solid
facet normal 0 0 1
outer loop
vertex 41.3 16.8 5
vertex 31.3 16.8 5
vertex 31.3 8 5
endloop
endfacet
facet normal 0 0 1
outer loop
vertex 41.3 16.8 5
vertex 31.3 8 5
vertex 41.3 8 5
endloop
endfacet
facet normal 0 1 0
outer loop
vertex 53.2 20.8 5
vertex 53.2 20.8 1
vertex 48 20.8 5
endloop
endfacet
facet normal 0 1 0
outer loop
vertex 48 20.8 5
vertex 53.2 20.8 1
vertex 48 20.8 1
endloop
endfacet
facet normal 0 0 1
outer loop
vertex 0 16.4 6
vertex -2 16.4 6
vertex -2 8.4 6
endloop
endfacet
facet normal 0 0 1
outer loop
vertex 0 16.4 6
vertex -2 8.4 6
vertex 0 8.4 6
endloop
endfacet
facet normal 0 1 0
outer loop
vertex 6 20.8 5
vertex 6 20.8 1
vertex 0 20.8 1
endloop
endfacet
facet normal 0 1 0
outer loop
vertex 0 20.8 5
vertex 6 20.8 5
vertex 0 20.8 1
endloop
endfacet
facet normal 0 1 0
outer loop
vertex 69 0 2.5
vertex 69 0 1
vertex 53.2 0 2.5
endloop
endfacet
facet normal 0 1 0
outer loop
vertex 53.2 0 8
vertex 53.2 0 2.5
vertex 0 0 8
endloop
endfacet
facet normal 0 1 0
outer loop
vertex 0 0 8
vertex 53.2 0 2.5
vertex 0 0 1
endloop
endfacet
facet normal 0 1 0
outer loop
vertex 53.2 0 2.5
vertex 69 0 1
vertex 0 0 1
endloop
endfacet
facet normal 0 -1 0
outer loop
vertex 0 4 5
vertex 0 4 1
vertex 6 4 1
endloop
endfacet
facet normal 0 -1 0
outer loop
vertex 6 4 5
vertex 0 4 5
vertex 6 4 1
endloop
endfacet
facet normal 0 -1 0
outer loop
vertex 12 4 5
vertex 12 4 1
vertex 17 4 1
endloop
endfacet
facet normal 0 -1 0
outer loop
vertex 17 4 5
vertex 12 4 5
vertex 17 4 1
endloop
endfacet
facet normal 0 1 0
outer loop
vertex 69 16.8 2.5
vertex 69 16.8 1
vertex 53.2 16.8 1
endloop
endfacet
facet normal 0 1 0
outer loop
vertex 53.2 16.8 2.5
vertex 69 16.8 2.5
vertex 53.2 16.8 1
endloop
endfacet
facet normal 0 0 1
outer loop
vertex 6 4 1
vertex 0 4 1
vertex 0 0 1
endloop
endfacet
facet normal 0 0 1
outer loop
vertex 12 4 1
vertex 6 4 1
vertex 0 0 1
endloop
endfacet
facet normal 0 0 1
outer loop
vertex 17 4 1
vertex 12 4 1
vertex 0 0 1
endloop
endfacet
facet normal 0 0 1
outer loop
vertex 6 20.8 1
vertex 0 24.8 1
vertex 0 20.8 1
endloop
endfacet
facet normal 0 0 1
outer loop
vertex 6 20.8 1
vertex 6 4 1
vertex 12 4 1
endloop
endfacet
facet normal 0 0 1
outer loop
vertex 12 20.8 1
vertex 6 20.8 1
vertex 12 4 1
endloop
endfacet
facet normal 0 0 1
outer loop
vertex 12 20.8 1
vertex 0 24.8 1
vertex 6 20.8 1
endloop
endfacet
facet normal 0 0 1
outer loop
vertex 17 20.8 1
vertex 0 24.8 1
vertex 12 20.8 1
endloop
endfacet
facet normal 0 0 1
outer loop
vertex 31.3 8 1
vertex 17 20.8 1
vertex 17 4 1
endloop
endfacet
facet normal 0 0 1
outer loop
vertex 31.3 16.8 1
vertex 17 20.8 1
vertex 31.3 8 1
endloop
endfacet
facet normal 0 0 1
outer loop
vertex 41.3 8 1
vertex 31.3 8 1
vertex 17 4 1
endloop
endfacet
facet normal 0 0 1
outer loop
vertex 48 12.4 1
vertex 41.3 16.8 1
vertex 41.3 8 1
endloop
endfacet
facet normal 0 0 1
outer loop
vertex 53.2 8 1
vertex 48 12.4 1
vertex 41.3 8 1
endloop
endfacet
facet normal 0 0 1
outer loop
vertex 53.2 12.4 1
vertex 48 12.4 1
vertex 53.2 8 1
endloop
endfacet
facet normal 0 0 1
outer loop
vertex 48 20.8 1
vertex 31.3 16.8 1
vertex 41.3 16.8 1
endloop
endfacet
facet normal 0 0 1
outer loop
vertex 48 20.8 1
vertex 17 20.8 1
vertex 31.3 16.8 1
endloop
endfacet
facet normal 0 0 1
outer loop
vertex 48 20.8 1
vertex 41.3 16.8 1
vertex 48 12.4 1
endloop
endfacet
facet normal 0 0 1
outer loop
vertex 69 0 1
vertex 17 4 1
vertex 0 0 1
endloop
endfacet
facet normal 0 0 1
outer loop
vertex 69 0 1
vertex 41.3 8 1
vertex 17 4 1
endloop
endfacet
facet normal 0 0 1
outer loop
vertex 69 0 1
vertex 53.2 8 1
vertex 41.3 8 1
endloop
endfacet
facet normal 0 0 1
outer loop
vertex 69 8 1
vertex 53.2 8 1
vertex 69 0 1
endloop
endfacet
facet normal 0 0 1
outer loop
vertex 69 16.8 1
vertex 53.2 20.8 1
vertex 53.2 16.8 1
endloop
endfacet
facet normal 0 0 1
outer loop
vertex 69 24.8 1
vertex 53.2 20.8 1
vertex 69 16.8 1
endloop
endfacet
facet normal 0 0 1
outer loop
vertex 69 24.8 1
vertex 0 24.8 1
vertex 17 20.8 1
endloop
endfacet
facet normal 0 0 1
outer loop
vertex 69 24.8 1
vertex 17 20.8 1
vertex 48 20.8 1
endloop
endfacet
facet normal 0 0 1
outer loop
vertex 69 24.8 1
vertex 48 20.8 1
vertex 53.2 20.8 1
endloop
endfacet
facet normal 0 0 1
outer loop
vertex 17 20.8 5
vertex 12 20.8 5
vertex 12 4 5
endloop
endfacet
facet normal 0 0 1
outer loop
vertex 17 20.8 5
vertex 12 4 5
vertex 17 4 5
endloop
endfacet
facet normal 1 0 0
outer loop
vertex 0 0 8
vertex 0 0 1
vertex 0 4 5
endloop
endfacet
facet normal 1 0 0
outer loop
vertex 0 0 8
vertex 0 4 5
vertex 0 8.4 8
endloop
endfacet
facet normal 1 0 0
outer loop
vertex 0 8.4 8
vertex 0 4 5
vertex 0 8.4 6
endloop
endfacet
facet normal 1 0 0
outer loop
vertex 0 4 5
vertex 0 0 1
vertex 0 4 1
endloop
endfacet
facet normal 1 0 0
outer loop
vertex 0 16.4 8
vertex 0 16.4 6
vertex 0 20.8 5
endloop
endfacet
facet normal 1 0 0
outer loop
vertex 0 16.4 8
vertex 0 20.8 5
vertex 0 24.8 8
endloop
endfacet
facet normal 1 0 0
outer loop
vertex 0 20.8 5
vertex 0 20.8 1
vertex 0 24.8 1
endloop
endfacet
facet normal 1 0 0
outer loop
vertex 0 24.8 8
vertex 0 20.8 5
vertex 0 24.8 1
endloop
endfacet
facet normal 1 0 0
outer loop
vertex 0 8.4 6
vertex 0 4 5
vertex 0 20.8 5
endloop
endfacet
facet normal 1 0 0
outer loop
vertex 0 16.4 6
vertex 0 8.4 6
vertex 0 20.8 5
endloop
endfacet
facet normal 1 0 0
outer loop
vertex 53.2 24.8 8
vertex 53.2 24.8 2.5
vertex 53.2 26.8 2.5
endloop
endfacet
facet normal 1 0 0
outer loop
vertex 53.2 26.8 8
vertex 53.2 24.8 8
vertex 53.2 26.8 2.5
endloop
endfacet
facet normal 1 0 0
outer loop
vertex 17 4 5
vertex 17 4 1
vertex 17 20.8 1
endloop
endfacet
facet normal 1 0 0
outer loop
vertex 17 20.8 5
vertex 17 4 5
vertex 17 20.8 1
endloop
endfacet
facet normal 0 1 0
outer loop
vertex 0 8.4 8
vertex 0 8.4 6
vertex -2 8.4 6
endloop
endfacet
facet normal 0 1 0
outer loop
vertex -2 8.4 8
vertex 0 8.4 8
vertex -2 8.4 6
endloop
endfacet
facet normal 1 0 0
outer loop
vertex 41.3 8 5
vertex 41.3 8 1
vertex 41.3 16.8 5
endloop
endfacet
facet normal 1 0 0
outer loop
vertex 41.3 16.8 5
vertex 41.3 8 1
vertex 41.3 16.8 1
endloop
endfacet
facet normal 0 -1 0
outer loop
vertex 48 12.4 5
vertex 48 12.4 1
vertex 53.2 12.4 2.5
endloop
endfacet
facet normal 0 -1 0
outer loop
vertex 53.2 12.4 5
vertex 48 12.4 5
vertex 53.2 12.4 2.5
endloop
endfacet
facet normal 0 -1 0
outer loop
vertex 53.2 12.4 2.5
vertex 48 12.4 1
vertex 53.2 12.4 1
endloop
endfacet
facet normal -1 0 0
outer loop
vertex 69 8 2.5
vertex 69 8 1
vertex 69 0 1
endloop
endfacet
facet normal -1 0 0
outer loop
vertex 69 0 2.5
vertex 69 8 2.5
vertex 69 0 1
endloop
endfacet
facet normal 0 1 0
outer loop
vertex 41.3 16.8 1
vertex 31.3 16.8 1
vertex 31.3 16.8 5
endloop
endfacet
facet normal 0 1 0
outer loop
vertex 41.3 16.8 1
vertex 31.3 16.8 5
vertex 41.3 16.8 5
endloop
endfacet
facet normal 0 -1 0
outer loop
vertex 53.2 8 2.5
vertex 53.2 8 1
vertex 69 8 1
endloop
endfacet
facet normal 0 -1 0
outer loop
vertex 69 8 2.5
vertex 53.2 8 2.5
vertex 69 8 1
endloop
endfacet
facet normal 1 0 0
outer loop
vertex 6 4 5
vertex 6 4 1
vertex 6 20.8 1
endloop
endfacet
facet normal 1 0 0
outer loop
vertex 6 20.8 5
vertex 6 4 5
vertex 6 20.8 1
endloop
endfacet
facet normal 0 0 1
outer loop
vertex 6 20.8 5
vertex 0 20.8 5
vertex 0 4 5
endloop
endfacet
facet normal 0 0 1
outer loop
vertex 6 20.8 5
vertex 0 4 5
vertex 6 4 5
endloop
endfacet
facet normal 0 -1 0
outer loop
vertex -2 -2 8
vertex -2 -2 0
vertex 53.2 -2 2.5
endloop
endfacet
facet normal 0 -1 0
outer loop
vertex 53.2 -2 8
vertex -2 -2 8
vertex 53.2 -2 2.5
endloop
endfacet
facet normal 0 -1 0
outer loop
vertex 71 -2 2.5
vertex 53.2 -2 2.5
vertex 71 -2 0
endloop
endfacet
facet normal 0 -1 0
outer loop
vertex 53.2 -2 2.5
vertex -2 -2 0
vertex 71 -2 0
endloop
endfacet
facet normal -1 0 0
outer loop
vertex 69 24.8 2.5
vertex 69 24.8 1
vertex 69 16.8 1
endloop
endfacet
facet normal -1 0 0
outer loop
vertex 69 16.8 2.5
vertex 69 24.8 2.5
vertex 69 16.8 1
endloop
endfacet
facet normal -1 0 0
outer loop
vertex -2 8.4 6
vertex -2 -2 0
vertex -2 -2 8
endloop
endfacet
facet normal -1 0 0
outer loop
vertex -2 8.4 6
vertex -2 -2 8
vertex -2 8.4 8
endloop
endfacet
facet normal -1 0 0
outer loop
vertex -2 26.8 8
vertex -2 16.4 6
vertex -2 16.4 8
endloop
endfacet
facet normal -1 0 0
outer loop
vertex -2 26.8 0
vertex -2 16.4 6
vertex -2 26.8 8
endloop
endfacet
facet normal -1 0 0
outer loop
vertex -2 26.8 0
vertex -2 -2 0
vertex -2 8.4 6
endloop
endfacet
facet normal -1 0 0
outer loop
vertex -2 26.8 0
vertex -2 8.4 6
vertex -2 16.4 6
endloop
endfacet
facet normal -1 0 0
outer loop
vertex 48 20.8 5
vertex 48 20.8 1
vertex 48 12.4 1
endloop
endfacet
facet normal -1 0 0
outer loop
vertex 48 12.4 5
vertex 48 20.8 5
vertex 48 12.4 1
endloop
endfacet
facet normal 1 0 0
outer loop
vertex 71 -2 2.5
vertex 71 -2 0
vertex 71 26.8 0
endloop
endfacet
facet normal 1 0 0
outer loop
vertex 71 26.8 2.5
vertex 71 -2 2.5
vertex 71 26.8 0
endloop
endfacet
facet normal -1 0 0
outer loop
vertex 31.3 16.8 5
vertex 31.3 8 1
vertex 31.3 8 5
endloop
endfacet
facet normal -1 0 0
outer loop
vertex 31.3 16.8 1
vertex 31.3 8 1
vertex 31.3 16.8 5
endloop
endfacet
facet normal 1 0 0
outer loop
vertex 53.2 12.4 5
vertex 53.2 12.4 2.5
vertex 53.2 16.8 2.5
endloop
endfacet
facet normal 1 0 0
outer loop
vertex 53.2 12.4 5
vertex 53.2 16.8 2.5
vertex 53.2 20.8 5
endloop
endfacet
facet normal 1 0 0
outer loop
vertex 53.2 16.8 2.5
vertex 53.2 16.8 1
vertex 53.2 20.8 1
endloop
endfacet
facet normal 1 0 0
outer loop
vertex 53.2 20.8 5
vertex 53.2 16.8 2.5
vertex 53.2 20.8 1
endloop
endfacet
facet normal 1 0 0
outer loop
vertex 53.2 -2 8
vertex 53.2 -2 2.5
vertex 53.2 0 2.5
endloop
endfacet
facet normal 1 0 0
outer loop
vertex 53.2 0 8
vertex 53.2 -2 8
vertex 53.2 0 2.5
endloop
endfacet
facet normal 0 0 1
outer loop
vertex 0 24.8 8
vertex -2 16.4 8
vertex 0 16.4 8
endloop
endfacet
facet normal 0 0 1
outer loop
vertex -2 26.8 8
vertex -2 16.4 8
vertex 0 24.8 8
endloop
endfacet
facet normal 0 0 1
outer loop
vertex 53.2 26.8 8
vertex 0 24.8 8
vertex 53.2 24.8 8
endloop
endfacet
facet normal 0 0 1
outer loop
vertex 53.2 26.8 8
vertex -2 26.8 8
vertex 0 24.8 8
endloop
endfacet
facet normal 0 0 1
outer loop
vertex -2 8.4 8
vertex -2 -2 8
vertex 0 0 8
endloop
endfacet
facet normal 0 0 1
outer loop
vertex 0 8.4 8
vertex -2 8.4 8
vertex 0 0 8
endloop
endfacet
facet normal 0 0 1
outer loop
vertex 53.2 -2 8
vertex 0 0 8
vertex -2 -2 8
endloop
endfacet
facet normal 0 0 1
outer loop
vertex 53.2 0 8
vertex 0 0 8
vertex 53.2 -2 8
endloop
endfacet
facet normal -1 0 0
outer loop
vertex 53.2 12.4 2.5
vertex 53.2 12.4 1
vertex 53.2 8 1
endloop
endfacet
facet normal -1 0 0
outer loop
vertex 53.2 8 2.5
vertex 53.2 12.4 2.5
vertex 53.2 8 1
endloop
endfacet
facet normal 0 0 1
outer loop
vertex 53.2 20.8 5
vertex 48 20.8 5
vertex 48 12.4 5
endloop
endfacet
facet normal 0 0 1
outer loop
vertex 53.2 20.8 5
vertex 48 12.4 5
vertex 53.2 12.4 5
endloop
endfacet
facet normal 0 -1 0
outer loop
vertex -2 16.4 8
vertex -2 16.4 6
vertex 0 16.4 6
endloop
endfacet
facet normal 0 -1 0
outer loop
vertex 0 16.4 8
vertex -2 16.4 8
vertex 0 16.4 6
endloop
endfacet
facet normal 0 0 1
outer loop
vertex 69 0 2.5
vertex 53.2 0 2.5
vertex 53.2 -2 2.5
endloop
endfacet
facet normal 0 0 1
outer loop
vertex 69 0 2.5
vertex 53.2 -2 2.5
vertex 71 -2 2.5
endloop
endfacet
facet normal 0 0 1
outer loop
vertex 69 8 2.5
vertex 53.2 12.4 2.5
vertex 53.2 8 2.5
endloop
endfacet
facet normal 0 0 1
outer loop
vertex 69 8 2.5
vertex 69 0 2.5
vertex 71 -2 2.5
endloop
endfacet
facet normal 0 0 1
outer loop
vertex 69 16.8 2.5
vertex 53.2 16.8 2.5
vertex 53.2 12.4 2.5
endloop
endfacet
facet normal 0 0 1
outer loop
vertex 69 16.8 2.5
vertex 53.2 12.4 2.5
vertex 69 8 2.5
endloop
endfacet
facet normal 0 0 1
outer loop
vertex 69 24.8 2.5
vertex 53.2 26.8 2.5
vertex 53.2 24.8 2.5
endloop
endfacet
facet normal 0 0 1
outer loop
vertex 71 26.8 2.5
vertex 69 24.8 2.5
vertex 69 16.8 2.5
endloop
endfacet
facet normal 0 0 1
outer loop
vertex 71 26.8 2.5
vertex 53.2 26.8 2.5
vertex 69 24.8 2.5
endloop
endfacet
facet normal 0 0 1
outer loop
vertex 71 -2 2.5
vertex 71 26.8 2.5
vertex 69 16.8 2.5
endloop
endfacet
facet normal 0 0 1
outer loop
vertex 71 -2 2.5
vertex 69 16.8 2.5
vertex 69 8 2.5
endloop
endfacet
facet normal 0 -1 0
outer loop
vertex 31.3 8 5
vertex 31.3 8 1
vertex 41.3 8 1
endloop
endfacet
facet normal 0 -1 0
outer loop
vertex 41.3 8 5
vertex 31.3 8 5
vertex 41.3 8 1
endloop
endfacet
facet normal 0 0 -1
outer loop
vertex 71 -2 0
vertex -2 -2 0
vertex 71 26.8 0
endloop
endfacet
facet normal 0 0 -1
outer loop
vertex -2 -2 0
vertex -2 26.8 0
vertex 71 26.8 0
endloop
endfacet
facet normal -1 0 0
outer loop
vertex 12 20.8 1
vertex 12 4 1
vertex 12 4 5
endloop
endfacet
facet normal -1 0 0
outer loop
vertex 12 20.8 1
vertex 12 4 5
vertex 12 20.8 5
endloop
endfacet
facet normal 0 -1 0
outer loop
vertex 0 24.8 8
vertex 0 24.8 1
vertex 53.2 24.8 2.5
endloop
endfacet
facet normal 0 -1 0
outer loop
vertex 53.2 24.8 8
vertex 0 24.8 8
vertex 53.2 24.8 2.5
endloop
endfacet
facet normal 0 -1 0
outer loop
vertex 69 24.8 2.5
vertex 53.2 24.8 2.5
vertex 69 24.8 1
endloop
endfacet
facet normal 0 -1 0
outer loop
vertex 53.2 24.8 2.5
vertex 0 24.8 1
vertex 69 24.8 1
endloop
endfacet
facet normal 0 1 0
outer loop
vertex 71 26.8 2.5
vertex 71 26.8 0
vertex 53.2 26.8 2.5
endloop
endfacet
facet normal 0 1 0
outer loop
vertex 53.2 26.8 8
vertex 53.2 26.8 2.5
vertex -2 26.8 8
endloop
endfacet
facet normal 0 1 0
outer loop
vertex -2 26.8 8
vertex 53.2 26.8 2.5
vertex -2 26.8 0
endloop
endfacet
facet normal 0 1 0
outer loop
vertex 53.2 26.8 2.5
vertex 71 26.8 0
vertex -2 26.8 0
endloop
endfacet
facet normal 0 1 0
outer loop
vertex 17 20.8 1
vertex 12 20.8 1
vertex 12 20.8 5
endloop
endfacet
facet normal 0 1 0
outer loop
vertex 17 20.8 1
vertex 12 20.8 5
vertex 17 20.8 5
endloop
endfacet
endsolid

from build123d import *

# Parameters (mm, degrees)
F0_W     = 5
F0_H     = 16.8
F0_W_2   = 10
F0_H_2   = 8.8
F0_W_3   = 15.8
F0_H_3   = 8
F1_DEPTH = 1
F0_H_4   = 2
F2_DEPTH = 2.5
F3_DEPTH = 5
F4_DEPTH = 8
F0_W_4   = 2
F5_DEPTH = 6


with BuildPart() as f1:
    # F0 (on Top) → F1 (new body)
    with BuildSketch(Plane.XY):
        Polygon((69, 24.8), (53.2, 24.8), (53.2, 20.8), (53.2, 16.8), (69, 16.8), align=None)
        Polygon((0, 24.8), (0, 20.8), (6, 20.8), (6, 4), (0, 4), (0, 0), (53.2, 0), (53.2, 8), (53.2, 12.4), (48, 12.4), (48, 20.8), (53.2, 20.8), (53.2, 24.8), align=None)
        with Locations((14.5, 12.4)):
            Rectangle(F0_W, F0_H, mode=Mode.SUBTRACT)
        with Locations((36.3, 12.4)):
            Rectangle(F0_W_2, F0_H_2, mode=Mode.SUBTRACT)
        with Locations((61.1, 4)):
            Rectangle(F0_W_3, F0_H_3)
    extrude(amount=F1_DEPTH)

    # F0 (on Top) → F2 (join)
    with BuildSketch(Plane.XY):
        with Locations((61.1, 25.8)):
            Rectangle(F0_W_3, F0_H_4)
        Polygon((69, 8), (69, 16.8), (53.2, 16.8), (53.2, 12.4), (53.2, 8), align=None)
        with Locations((61.1, -1)):
            Rectangle(F0_W_3, F0_H_4)
        Polygon((69, 26.8), (69, 24.8), (69, 16.8), (69, 8), (69, 0), (69, -2), (71, -2), (71, 26.8), align=None)
    extrude(amount=F2_DEPTH)

    # F0 (on Top) → F3 (join)
    with BuildSketch(Plane.XY):
        Polygon((6, 20.8), (0, 20.8), (0, 16.4), (0, 8.4), (0, 4), (6, 4), align=None)
        with Locations((14.5, 12.4)):
            Rectangle(F0_W, F0_H)
        with Locations((36.3, 12.4)):
            Rectangle(F0_W_2, F0_H_2)
        Polygon((53.2, 16.8), (53.2, 20.8), (48, 20.8), (48, 12.4), (53.2, 12.4), align=None)
    extrude(amount=F3_DEPTH)

    # F0 (on Top) → F4 (join)
    with BuildSketch(Plane.XY):
        Polygon((0, 16.4), (0, 20.8), (0, 24.8), (53.2, 24.8), (53.2, 26.8), (-2, 26.8), (-2, 16.4), align=None)
        Polygon((0, 4), (0, 8.4), (-2, 8.4), (-2, -2), (53.2, -2), (53.2, 0), (0, 0), align=None)
    extrude(amount=F4_DEPTH)

    # F0 (on Top) → F5 (join)
    with BuildSketch(Plane.XY):
        with Locations((-1, 12.4)):
            Rectangle(F0_W_4, F0_H_3)
    extrude(amount=F5_DEPTH)


solid = f1.part
